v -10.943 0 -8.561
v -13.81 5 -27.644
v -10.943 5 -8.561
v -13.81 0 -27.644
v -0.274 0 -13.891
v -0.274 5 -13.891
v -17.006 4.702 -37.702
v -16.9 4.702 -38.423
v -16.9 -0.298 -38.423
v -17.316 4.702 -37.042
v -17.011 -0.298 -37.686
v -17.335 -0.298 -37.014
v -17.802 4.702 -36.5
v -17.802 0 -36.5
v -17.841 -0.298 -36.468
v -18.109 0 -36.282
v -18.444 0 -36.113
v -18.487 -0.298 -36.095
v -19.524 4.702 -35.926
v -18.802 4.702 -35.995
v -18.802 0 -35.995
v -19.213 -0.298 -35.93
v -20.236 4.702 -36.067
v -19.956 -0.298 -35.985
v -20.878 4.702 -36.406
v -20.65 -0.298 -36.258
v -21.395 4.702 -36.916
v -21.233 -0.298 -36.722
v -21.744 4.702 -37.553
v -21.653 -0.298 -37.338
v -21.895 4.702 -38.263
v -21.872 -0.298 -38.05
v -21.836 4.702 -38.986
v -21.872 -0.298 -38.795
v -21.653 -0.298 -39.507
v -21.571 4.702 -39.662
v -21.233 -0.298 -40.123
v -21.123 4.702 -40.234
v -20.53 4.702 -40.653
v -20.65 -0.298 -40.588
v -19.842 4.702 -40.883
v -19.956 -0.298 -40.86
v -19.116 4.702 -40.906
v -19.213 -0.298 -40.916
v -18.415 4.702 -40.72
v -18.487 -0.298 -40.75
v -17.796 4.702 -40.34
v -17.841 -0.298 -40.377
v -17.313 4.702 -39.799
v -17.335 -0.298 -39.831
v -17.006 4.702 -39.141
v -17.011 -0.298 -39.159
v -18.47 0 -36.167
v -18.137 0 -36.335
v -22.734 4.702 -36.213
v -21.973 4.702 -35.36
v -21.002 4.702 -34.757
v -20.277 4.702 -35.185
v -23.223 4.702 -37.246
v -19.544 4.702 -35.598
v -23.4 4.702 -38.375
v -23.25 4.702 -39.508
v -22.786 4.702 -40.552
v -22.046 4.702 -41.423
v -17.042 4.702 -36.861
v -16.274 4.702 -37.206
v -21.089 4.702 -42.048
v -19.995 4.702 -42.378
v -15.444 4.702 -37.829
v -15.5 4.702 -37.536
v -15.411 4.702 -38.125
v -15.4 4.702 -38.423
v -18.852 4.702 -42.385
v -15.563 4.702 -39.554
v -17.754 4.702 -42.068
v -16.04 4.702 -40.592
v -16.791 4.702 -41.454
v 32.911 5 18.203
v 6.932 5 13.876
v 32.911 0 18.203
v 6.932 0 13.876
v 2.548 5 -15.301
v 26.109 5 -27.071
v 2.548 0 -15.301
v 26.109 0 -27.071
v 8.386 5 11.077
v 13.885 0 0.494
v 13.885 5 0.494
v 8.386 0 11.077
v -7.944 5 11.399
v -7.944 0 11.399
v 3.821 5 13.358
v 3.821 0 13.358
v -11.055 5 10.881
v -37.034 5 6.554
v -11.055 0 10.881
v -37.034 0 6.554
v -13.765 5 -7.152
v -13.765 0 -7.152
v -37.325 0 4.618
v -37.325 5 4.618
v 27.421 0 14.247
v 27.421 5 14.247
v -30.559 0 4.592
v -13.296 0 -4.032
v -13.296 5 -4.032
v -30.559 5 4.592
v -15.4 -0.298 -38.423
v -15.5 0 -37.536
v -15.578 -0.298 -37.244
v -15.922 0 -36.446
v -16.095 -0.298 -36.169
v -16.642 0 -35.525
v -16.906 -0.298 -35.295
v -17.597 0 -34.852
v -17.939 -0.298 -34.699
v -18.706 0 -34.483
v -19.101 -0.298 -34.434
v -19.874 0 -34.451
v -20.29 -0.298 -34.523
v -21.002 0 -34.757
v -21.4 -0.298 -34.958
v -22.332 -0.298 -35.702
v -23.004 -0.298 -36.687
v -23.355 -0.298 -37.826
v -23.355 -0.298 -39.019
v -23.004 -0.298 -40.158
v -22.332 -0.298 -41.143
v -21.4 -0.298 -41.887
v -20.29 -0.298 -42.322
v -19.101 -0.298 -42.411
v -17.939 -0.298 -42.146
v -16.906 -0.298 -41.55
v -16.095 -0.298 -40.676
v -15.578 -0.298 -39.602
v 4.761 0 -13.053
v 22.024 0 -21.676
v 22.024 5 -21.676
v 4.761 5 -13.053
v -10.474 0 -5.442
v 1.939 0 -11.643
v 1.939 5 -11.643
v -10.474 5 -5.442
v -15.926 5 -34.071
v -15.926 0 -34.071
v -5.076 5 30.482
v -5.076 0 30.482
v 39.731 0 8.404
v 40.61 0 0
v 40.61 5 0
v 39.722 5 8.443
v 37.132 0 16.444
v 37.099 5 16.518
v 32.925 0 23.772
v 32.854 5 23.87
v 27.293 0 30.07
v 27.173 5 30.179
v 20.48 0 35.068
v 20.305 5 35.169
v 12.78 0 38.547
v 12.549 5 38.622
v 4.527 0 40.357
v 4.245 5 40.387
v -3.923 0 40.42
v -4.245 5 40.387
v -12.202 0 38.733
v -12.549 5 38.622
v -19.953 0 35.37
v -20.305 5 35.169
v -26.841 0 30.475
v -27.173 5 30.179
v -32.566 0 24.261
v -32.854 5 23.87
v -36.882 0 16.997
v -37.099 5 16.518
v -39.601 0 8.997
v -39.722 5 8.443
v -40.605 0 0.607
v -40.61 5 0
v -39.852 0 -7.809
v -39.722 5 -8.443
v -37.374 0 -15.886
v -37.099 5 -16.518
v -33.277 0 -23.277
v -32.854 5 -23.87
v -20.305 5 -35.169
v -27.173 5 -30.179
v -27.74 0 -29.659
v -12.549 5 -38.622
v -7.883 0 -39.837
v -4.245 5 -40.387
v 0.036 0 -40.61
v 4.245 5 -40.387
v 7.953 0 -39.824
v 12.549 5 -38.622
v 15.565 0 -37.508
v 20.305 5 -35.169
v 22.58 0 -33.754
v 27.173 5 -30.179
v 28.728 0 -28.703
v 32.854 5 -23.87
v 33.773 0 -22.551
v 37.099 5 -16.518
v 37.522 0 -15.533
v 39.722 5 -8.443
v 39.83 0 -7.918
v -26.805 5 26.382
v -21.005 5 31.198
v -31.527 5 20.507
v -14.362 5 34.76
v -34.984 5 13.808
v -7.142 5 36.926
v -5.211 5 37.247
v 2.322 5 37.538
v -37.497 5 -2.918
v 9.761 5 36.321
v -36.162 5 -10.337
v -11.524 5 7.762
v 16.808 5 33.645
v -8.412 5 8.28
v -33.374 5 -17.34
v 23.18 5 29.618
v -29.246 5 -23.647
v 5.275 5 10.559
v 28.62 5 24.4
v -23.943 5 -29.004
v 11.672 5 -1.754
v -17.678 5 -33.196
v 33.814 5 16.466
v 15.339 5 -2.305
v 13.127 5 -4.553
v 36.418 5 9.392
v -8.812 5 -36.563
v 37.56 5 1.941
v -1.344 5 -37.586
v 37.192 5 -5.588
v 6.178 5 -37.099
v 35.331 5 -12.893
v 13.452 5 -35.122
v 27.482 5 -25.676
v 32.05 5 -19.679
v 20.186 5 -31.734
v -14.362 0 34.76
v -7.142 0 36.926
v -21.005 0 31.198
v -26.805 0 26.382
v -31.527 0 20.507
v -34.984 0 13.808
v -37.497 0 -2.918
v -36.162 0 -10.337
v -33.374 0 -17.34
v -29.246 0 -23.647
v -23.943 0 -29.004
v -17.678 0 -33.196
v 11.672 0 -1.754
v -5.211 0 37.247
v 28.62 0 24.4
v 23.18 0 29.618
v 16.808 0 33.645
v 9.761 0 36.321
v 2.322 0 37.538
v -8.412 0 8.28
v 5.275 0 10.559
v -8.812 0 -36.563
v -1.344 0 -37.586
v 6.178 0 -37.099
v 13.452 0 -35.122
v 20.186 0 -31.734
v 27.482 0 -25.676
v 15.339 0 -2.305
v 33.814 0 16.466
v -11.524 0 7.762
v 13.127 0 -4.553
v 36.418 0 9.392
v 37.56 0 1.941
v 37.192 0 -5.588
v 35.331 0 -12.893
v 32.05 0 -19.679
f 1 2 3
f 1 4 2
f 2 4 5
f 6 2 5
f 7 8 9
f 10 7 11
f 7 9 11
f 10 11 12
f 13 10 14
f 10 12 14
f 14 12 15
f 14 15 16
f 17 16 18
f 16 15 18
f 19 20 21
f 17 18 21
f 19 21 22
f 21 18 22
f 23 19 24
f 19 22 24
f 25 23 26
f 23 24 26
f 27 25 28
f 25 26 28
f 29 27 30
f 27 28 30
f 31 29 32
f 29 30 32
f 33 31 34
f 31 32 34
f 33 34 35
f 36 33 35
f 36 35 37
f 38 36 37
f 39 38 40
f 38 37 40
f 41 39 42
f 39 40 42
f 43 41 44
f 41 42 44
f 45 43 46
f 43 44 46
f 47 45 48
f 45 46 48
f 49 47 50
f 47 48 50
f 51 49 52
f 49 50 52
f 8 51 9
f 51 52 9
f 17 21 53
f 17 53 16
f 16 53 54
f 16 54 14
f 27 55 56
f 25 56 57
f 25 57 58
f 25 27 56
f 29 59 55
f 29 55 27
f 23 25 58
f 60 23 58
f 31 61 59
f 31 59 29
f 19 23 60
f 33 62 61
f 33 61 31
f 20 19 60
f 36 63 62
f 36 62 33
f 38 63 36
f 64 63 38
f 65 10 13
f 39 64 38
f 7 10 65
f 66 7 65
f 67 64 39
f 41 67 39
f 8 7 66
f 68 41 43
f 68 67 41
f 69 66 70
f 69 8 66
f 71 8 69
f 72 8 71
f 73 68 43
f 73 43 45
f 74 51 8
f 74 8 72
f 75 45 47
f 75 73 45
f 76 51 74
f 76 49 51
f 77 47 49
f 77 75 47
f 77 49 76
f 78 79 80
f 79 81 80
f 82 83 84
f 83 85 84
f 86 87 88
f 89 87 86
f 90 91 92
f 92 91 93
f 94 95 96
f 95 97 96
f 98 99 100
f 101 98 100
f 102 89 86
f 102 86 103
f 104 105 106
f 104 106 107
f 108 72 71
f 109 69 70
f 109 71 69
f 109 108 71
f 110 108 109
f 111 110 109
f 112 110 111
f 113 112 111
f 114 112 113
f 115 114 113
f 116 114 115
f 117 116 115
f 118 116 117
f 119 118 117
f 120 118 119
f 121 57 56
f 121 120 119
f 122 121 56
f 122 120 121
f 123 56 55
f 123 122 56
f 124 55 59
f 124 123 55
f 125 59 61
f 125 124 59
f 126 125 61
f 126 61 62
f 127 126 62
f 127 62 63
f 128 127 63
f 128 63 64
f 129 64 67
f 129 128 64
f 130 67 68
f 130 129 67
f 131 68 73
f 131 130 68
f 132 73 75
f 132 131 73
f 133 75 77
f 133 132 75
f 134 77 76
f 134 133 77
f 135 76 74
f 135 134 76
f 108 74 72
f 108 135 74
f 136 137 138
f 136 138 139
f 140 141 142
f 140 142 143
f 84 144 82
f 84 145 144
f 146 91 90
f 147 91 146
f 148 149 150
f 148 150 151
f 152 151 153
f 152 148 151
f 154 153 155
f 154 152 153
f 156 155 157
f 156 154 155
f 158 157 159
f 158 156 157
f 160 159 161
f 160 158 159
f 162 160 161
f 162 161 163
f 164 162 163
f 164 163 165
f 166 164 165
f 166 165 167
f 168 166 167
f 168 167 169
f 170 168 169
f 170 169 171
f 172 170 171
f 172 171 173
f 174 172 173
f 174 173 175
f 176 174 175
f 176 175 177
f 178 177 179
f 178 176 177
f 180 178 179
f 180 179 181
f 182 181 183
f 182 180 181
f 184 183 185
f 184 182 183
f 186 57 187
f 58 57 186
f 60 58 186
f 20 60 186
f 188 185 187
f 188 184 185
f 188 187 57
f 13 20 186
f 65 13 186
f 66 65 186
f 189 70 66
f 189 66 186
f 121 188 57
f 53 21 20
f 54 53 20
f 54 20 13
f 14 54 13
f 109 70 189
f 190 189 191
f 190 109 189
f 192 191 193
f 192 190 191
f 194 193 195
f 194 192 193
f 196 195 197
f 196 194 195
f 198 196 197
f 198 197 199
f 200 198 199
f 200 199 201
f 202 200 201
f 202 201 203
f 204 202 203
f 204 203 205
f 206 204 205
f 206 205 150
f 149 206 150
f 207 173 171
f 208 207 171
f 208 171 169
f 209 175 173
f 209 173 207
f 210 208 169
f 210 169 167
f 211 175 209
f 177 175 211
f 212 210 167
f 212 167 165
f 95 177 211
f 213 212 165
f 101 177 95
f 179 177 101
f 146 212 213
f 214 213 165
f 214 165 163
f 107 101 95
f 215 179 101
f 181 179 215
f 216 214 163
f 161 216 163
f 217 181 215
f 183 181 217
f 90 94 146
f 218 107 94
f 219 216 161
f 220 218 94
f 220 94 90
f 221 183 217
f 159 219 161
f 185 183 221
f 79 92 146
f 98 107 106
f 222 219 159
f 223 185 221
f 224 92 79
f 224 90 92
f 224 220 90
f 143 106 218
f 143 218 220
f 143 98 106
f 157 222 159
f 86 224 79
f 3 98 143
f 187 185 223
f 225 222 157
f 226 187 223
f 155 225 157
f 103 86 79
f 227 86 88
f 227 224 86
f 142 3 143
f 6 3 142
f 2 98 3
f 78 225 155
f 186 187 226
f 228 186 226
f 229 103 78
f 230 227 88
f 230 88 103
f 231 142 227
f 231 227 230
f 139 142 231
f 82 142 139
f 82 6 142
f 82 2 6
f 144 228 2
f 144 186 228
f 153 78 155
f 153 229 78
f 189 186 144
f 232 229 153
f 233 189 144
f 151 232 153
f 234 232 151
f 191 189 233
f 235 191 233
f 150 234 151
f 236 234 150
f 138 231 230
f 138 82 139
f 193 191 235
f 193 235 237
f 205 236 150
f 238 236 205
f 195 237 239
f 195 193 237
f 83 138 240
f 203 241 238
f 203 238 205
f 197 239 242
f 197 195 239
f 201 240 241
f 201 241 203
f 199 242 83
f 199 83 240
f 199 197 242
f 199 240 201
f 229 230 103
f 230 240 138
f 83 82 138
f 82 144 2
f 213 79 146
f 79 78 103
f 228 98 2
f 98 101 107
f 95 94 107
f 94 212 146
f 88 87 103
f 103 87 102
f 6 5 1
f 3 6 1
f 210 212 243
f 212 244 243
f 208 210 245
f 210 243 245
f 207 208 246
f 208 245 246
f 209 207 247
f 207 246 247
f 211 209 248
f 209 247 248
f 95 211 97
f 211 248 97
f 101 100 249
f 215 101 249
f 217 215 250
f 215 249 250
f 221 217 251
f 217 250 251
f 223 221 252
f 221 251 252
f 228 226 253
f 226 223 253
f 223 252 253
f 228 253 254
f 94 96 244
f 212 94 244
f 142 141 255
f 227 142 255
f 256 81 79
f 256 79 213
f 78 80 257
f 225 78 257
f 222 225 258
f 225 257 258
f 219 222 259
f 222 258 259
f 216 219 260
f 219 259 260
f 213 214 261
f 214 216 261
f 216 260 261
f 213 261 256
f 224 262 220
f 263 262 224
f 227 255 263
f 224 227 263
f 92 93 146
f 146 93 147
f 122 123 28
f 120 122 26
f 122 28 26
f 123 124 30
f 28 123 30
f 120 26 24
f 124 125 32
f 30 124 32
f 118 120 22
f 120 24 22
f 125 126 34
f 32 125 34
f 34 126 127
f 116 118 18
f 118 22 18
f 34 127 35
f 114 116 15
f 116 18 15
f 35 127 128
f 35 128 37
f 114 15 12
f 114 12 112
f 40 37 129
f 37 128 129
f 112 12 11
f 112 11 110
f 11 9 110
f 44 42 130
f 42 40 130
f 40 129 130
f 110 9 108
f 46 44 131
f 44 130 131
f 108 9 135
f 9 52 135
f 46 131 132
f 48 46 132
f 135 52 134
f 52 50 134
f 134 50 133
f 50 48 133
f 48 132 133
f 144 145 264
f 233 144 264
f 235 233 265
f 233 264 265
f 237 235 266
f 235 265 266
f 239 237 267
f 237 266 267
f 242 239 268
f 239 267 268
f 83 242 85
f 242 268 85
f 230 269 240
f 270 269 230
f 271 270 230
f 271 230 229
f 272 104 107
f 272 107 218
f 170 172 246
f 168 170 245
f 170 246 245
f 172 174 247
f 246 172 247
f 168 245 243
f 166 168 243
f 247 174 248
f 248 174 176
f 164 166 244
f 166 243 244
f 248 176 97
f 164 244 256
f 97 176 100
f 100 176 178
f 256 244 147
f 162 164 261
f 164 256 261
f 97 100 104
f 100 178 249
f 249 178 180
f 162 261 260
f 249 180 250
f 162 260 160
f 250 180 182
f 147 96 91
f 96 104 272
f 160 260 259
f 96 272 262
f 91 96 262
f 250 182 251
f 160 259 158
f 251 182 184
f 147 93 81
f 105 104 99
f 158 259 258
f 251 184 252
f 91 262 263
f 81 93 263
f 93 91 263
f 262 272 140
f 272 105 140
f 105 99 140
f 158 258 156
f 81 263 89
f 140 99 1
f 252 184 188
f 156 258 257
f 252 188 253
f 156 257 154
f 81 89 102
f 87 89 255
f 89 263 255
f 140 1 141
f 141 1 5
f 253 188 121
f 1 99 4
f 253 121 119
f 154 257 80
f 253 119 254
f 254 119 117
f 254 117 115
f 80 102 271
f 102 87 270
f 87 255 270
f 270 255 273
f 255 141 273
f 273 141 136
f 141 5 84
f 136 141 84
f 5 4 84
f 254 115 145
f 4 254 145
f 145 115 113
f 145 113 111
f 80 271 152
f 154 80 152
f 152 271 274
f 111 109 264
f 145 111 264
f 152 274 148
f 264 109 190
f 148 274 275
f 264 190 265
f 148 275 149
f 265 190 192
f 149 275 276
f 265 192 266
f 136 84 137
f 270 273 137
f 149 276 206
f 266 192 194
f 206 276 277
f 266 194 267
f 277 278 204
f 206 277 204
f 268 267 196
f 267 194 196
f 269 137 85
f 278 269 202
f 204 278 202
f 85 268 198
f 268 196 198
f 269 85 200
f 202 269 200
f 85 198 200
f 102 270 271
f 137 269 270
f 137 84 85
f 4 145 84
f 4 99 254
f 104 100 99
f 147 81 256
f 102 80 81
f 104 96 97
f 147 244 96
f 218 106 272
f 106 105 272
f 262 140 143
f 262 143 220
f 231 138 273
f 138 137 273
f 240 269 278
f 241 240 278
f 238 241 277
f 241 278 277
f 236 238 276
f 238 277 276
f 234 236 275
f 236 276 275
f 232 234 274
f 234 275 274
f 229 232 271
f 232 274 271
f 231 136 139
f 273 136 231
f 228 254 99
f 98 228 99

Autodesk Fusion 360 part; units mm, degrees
sketch "草图1" plane through (0, 0, 0) normal (0, 1, 0) x (1, 0, 0)
  circle A0 centre (0, 0) radius 40.6099
  line L0 (-13.7646, 7.1517) -> (-37.3253, -4.6183)
  line L1 (-13.2959, 4.0323) -> (-30.5587, -4.5915)
  line L2 (-17.6778, 33.1964) -> (-13.7646, 7.1517)
  line L3 (-13.8099, 27.6442) -> (-10.9427, 8.5614)
  line L4 (-13.2959, 4.0323) -> (-11.5238, -7.7615)
  line L5 (-11.0551, -10.8809) -> (-7.1419, -36.9256)
  line L6 (-10.474, 5.442) -> (-8.4123, -8.2797)
  line L7 (-7.9436, -11.3991) -> (-5.0764, -30.4819)
  line L8 (-30.5587, -4.5915) -> (-11.5238, -7.7615)
  line L9 (-37.0344, -6.5544) -> (-11.0551, -10.8809)
  line L10 (3.8206, -13.3583) -> (-5.0764, -30.4819)
  line L11 (6.9321, -13.8764) -> (-5.2107, -37.2472)
  line L12 (-8.4123, -8.2797) -> (5.2749, -10.5591)
  line L13 (8.3865, -11.0773) -> (27.4213, -14.2473)
  line L14 (-7.9436, -11.3991) -> (3.8206, -13.3583)
  line L15 (6.9321, -13.8764) -> (32.9114, -18.203)
  line L16 (13.8851, -0.4943) -> (27.4213, -14.2473)
  line L17 (15.3394, 2.3048) -> (33.814, -16.4657)
  line L18 (27.4822, 25.6755) -> (15.3394, 2.3048)
  line L19 (13.8851, -0.4943) -> (8.3865, -11.0773)
  line L20 (22.0237, 21.6765) -> (13.1267, 4.5529)
  line L21 (11.6724, 1.7538) -> (5.2749, -10.5591)
  line L22 (-15.9264, 34.0713) -> (2.5482, 15.3009)
  line L23 (4.7609, 13.0527) -> (13.1267, 4.5529)
  line L24 (-13.8099, 27.6442) -> (-0.2737, 13.8912)
  line L25 (1.939, 11.643) -> (11.6724, 1.7538)
  line L26 (26.1089, 27.0709) -> (2.5482, 15.3009)
  line L27 (-0.2737, 13.8912) -> (-10.9427, 8.5614)
  line L28 (22.0237, 21.6765) -> (4.7609, 13.0527)
  line L29 (1.939, 11.643) -> (-10.474, 5.442)
  arc A1 (33.814, -16.4657) -> (27.4822, 25.6755) centre (0, 0) ccw
  arc A2 (-5.2107, -37.2472) -> (32.9114, -18.203) centre (0, 0) ccw
  arc A3 (-37.0344, -6.5544) -> (-7.1419, -36.9256) centre (0, 0) ccw
  arc A4 (26.1089, 27.0709) -> (-15.9264, 34.0713) centre (0, 0) ccw
  arc A5 (-17.6778, 33.1964) -> (-37.3253, -4.6183) centre (0, 0) ccw
extrude "拉伸1" add sketch "草图1" along normal blind 5 makes body 1
sketch "草图2" plane through (0, 0, 0) normal (0, 1, 0) x (1, 0, 0)
  circle A0 centre (70, 0) radius 2.5
  circle A1 centre (70, 0) radius 4
  dimension "d6" = 5
  dimension "d7" = 8
extrude "拉伸2" add sketch "草图2" along normal blind 5 separate body makes body 2
move_body "移动1" bodies 2 to x (1, 0, 0) y (0, 1, 0) z (0, 0, 1) at (-89.4001, -0.2978, -38.4226)
combine "合并1" operation add target body 1 tool bodies 2
